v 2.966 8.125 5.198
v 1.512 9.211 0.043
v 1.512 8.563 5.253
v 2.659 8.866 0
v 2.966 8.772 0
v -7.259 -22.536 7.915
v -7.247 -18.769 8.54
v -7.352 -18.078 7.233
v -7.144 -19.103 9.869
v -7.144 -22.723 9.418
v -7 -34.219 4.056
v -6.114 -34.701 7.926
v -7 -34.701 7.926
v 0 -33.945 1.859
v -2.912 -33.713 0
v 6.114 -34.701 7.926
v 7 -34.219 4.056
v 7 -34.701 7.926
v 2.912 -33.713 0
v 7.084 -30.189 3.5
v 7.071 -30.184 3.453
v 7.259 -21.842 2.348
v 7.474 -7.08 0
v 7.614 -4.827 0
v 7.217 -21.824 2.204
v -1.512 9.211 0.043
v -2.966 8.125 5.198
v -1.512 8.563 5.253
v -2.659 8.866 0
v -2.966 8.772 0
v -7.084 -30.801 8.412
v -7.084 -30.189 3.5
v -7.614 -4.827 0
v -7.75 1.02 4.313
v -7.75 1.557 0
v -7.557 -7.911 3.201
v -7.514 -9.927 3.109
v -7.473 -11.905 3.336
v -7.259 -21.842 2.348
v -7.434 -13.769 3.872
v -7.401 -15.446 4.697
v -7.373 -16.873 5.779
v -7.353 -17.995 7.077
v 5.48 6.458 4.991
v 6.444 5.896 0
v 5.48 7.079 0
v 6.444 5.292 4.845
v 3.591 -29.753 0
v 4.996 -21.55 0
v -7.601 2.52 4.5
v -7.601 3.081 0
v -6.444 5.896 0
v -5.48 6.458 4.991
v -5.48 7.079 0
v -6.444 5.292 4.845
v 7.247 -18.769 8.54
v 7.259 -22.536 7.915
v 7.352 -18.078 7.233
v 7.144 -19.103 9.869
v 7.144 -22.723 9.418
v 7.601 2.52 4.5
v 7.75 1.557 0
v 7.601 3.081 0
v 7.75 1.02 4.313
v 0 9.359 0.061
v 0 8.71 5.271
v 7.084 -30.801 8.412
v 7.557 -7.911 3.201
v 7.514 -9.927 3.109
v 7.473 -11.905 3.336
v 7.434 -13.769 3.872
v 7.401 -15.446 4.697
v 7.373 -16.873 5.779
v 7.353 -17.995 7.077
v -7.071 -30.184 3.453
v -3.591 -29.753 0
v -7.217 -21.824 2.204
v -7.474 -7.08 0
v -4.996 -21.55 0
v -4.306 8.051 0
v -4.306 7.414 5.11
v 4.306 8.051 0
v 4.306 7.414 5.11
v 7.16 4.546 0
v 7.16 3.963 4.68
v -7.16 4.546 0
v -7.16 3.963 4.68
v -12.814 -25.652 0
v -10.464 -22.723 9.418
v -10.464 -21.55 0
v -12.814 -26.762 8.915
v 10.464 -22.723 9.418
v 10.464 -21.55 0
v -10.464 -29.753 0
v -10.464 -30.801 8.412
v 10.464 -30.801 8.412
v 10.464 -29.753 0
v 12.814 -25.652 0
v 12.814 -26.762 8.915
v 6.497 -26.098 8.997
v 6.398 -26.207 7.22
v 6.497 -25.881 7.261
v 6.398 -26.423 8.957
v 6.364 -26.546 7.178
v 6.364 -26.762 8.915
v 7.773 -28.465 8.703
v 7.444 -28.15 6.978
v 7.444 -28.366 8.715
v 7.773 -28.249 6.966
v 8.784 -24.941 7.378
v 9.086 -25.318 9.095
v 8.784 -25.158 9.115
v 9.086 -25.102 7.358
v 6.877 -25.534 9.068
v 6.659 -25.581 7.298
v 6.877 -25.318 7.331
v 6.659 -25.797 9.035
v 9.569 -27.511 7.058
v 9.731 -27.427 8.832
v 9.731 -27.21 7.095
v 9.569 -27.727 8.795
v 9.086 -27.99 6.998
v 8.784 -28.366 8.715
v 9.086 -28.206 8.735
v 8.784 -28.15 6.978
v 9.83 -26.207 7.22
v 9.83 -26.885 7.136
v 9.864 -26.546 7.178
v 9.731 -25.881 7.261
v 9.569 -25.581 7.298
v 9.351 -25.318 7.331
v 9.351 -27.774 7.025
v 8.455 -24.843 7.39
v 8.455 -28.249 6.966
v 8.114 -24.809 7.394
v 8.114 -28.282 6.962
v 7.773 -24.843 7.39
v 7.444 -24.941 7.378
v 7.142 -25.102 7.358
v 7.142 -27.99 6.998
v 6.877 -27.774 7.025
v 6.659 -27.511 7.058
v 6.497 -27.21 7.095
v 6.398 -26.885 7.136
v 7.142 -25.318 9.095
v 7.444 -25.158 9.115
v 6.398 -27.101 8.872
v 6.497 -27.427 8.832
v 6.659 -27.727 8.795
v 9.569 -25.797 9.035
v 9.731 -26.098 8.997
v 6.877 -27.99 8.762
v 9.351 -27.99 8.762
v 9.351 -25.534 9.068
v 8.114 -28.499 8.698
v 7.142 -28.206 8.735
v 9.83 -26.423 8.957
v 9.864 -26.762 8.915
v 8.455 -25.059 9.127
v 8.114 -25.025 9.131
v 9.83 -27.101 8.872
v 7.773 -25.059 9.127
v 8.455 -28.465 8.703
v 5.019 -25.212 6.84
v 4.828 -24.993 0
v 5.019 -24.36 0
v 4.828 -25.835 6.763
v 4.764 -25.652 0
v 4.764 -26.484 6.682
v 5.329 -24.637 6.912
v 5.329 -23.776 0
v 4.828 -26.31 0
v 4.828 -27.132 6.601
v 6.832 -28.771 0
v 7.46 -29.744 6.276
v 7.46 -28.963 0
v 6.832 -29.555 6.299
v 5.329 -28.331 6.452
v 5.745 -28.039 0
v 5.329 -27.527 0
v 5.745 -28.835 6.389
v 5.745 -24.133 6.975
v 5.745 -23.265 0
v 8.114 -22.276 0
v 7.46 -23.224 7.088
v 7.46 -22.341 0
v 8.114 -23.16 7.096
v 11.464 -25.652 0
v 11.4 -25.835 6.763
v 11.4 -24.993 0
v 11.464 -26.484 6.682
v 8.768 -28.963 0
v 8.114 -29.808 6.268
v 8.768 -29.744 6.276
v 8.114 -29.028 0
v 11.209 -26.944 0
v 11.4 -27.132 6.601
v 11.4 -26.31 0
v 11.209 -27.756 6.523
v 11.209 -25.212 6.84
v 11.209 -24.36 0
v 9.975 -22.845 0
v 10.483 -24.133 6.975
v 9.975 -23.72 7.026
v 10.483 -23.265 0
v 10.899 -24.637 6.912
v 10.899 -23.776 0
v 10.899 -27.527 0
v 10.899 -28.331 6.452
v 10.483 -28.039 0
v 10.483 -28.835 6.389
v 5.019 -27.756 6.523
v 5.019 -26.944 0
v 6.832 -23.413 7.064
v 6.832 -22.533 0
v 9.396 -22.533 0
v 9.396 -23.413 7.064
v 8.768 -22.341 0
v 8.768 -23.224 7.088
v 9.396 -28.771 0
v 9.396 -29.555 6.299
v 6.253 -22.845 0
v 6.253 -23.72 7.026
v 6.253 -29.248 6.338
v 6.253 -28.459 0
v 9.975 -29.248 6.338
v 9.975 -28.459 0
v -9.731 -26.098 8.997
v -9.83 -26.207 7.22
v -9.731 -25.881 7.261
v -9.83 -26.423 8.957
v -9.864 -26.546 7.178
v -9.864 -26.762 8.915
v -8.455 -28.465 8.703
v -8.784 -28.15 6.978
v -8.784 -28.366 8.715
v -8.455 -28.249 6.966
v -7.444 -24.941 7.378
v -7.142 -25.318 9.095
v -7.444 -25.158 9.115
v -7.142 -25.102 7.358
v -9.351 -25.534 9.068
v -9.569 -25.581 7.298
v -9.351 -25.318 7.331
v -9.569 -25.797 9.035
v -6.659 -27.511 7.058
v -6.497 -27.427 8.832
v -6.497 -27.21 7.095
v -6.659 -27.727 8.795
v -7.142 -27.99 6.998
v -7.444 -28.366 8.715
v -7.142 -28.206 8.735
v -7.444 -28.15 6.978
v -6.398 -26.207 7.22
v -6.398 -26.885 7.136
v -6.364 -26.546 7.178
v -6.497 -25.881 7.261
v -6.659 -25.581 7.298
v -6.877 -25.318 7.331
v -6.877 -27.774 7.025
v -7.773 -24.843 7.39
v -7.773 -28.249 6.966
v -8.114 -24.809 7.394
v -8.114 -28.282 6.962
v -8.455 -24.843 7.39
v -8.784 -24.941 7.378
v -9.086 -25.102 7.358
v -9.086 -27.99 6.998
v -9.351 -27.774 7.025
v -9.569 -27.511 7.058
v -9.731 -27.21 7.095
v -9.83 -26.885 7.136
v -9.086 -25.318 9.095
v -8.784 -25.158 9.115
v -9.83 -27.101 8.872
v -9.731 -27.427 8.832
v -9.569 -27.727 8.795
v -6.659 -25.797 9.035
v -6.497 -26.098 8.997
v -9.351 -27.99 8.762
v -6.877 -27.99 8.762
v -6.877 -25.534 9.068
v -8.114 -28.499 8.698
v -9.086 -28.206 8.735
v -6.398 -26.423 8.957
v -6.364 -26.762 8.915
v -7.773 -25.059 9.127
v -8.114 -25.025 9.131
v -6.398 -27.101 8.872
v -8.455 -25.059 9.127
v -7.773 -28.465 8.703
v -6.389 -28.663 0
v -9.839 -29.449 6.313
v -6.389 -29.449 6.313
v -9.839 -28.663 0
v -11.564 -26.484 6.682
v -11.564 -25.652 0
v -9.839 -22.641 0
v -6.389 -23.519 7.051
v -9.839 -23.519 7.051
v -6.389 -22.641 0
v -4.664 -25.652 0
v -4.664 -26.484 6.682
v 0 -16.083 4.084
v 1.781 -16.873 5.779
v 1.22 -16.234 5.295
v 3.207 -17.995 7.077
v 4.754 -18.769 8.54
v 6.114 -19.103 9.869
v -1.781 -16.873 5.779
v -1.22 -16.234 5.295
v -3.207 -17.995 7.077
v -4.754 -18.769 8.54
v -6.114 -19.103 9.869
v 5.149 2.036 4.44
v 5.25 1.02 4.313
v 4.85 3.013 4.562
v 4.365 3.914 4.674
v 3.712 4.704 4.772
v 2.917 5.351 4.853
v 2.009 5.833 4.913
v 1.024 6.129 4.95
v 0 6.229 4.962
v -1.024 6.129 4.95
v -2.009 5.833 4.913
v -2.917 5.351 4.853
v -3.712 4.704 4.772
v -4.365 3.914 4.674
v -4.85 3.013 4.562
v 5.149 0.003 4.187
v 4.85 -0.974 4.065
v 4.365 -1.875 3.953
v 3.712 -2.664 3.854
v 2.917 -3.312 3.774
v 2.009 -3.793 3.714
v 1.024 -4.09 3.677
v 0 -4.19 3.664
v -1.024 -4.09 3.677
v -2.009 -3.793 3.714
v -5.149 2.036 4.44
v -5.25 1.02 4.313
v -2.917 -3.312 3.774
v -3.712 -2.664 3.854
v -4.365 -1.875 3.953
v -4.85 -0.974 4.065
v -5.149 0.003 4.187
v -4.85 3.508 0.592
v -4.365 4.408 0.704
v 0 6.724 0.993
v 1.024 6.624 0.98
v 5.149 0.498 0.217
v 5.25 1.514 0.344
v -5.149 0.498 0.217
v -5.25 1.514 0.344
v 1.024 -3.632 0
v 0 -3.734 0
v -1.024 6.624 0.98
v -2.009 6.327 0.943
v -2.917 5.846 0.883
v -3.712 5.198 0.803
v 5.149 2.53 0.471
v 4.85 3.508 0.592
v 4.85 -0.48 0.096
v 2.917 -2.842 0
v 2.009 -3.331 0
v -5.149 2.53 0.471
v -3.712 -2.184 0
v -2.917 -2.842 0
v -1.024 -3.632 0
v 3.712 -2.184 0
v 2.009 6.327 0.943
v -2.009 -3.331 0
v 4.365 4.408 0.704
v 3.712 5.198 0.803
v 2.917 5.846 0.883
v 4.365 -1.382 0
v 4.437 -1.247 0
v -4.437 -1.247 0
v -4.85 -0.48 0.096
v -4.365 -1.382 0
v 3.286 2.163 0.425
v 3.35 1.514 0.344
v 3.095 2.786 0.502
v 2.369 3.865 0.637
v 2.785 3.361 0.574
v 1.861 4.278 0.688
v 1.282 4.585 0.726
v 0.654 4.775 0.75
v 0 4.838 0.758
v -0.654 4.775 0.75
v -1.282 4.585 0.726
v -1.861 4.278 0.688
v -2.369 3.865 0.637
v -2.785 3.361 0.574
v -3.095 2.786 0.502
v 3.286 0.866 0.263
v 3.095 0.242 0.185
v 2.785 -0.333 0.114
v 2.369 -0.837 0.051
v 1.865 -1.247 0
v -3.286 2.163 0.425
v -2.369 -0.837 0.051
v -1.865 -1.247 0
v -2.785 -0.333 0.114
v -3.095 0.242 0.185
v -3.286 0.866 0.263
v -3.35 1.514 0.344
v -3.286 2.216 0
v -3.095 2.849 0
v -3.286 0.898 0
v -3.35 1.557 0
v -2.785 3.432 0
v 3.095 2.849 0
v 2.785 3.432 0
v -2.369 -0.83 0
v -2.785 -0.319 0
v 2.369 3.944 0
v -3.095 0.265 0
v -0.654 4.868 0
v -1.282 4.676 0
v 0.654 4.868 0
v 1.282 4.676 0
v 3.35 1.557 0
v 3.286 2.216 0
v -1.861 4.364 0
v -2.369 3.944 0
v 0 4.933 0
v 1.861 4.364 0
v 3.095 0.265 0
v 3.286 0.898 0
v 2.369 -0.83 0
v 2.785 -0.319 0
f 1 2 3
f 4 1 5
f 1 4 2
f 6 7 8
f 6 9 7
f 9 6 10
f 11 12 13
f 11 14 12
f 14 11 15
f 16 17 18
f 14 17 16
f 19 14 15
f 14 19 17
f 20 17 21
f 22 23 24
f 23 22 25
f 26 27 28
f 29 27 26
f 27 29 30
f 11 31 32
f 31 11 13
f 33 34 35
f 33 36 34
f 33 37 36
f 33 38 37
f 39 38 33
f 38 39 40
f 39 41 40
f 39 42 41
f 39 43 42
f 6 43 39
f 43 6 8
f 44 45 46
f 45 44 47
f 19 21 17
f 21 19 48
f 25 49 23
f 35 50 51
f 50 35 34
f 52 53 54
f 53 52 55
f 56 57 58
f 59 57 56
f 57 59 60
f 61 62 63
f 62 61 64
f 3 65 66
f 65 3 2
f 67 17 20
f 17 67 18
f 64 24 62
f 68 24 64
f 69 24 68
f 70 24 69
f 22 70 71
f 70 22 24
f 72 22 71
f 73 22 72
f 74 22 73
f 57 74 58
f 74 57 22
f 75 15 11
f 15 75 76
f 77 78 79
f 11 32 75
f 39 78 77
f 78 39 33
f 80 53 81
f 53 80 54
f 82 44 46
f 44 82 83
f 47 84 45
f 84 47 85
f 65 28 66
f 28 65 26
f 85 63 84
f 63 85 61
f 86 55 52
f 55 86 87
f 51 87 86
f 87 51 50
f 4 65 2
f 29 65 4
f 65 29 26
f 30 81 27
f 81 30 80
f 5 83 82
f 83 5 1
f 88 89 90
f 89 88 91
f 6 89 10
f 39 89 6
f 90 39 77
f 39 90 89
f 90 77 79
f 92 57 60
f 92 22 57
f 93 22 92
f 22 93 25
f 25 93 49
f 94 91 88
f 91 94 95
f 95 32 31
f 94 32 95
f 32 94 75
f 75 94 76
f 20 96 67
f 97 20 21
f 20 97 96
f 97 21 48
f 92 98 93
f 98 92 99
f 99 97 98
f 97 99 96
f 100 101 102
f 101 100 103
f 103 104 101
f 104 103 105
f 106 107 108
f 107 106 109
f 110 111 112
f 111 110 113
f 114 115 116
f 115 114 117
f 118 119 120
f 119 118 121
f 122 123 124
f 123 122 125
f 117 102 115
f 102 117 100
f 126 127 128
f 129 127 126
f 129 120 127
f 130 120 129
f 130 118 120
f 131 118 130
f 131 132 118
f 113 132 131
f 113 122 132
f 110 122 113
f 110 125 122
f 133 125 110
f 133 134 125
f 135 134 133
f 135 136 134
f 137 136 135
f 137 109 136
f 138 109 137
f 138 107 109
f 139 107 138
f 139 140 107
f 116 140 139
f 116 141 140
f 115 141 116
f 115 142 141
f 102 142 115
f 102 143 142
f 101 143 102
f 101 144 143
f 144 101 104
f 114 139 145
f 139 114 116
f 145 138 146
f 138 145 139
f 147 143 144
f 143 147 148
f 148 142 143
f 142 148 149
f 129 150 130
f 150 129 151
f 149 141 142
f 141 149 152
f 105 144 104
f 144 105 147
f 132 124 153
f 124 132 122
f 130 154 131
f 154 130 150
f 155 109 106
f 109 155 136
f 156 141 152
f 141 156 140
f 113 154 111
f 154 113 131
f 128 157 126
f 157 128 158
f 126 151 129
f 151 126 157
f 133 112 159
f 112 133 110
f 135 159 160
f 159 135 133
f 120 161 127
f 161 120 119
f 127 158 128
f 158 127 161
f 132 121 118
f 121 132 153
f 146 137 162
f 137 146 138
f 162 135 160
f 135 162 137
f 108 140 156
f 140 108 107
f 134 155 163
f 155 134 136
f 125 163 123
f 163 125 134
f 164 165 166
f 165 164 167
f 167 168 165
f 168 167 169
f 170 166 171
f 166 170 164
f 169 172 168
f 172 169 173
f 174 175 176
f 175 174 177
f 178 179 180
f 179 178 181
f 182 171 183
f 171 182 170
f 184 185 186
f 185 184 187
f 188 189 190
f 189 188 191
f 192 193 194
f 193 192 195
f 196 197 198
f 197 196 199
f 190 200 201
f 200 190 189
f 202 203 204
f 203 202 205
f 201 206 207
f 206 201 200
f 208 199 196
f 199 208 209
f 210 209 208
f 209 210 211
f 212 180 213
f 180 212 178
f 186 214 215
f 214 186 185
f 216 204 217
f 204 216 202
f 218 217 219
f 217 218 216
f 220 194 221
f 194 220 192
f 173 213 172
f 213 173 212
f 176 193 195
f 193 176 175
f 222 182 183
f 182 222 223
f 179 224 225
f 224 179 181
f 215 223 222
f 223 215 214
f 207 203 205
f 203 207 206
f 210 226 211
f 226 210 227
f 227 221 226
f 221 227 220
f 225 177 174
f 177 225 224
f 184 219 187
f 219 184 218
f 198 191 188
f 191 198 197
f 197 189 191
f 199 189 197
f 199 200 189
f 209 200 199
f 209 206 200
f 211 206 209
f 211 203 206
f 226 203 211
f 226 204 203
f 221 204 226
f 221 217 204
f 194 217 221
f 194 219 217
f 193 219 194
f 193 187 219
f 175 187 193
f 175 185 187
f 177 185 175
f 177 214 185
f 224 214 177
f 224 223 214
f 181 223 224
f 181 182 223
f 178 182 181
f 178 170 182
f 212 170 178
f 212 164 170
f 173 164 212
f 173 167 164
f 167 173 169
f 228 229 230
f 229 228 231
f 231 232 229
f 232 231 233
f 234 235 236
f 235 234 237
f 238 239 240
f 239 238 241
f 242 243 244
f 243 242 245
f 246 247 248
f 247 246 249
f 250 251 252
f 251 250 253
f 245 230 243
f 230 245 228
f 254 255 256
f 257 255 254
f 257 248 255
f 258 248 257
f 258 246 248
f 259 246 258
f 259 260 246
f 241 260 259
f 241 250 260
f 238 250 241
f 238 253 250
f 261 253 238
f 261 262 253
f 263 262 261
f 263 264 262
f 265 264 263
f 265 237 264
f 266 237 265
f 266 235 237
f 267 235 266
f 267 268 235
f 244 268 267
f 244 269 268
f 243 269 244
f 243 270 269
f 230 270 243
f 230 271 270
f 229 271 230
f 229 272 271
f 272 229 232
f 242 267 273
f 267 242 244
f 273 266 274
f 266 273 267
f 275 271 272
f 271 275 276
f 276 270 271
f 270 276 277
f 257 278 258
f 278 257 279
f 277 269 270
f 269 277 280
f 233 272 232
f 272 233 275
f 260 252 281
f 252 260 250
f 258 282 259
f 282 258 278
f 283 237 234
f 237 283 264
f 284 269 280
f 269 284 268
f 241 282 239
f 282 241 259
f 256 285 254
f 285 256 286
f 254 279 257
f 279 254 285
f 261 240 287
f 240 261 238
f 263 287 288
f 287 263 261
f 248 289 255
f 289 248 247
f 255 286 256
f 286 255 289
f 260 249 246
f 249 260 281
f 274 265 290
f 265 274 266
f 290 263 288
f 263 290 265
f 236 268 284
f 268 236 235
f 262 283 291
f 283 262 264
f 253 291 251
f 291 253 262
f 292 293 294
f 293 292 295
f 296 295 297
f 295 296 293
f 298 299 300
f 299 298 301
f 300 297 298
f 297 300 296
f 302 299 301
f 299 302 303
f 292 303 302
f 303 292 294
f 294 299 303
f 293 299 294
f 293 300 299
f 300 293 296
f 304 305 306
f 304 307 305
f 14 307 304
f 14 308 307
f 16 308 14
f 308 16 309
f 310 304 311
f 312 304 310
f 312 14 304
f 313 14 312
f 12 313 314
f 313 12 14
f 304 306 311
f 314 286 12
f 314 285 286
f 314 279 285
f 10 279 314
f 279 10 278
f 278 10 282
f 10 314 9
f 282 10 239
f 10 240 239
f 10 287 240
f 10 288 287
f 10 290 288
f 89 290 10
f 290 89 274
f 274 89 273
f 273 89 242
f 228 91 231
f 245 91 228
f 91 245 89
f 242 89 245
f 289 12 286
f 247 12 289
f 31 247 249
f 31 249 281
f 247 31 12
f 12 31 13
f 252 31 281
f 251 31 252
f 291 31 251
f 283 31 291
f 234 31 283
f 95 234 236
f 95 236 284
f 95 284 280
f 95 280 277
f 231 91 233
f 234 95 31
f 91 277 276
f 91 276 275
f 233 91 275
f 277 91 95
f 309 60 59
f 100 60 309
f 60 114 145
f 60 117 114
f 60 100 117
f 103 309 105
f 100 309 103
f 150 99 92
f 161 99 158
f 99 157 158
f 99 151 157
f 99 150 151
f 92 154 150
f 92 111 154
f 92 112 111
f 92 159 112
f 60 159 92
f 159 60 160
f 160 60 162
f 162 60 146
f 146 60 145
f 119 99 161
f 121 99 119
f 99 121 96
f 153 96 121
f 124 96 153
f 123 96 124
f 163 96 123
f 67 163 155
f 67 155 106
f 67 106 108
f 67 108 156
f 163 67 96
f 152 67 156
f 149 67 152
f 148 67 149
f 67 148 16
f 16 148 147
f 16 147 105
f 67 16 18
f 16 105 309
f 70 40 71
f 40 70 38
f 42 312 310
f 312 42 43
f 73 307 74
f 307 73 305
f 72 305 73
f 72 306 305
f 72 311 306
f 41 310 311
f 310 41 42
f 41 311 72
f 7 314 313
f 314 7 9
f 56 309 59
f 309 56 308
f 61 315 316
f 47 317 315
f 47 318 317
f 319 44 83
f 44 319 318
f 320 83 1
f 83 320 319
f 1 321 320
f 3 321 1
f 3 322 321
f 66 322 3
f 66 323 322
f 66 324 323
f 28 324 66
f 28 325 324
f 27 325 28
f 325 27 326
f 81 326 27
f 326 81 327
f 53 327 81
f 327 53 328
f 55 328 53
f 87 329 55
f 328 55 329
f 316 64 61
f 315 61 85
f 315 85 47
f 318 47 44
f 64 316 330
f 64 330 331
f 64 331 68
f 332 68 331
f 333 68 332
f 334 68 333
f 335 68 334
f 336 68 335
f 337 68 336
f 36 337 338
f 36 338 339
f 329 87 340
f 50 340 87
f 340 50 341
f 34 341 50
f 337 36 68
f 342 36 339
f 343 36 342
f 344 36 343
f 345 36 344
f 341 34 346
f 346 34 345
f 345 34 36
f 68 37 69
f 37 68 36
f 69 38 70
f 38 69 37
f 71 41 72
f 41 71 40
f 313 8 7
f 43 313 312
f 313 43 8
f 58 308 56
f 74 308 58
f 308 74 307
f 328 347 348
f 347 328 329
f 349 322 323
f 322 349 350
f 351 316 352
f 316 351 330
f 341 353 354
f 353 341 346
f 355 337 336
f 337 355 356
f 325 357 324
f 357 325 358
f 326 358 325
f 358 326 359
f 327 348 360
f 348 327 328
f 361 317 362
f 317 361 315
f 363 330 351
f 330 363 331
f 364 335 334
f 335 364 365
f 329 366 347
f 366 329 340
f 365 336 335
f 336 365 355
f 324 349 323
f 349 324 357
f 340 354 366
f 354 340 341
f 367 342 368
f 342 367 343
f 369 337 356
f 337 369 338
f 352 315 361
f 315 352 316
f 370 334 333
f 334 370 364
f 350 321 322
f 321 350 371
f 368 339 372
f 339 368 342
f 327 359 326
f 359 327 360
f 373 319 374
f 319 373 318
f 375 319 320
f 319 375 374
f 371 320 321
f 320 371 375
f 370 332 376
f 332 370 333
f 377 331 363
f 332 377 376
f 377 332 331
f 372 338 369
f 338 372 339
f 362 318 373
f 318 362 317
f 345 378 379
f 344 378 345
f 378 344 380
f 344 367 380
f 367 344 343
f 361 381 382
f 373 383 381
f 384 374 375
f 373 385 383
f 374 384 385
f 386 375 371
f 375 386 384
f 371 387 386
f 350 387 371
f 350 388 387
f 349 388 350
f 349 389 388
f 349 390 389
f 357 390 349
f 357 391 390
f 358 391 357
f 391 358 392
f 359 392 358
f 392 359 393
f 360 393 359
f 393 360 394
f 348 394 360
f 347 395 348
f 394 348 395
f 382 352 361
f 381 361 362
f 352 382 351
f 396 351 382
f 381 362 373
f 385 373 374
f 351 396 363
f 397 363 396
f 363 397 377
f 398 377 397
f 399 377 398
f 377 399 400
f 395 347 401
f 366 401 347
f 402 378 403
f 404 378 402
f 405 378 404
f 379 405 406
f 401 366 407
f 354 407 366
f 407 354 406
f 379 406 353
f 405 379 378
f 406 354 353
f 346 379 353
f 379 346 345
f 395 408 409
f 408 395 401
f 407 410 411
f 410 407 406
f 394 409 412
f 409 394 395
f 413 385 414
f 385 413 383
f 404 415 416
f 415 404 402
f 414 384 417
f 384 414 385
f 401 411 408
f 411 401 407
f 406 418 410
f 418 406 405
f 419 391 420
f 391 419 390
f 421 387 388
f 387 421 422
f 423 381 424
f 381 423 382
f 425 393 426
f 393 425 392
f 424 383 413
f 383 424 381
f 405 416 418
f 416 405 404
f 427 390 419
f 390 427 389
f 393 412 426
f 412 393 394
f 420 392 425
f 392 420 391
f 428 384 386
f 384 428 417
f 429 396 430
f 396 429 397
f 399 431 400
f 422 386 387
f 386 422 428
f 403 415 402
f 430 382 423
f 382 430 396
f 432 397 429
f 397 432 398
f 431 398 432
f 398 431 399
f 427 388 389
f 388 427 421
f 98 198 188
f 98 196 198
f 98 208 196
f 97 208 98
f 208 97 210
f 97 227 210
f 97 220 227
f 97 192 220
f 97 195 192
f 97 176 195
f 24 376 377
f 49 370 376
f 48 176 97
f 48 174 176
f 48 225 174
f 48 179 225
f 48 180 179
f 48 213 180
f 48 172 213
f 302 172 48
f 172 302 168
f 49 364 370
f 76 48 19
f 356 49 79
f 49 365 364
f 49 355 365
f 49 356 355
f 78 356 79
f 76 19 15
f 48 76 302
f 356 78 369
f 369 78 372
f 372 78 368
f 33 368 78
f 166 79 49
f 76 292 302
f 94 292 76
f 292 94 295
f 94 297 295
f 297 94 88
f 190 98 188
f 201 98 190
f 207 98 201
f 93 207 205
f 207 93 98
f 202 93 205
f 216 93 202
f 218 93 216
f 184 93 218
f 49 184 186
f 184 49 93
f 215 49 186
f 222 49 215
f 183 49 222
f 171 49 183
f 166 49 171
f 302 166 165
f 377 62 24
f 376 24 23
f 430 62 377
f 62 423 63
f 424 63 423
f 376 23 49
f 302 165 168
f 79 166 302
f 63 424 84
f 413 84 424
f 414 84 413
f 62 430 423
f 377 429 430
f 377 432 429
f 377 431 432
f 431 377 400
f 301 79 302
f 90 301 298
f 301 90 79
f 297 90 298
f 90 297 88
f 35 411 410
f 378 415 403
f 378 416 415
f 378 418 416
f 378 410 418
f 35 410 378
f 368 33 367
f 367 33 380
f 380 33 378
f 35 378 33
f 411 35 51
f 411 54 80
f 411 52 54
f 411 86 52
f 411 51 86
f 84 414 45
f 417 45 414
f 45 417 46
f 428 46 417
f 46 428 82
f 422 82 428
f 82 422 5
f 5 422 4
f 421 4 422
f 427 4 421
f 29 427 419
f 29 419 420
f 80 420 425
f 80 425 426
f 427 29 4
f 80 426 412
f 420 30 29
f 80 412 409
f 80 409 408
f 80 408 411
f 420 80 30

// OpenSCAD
slop = .25;

screw_dia = 3;
screw_rad = screw_dia/2+slop;

cap_dia = 5.7;
cap_rad = cap_dia/2+slop;
cap_thick = 1.65+slop/2;
cap_hex_rad = (2/cos(30))/2;

nut_dia = 6.4;
nut_rad = nut_dia/2+slop;
nut_thick = 2.4+slop;

bearing_dia = 10;
bearing_rad = bearing_dia/2+slop;
bearing_thick = 5+slop;



wall = 2.5;
bearing_cone_height = 2;
arm_width = 14;
center = arm_width-bearing_cone_height*2-slop*2;
center_height = nut_dia+wall/2;
screw_len = 11;

//%cube([27,27,27],center=true);

$fn=32;

//uses two m3 by 10mm, one m3 by 30mm, three nuts, four 603zz bearings.
*union(){
	rotate([0,90,0]) center();
	half_arm();
	rotate([0,180,0]) half_arm();

	rotate([0,0,180]) rotate([0,90,0]) rotate([80,0,0]){
		half_arm();
		rotate([0,180,0]) half_arm();
	}
}

//for printing
difference(){
	translate([0,0,12.5]) rotate([7.1,0,0]) rotate([0,90,0]) half_arm();
	translate([0,0,-25]) cube([100,100,50], center=true);
}
//center();


//NOTE:  Rostock jaws are 8.4mm wide.
echo("arm_sep=", center+bearing_cone_height*2);
//Right now these are 13.5mm.  That's kind of a lot.




module half_arm(){
	rod_rad = 4.5;
	width = arm_width+wall+bearing_thick*2;
	cutout_offset = 9;
	clamp_dist = -27;

	difference(){
		union(){
			hull(){
				//caress the bearing
				translate([arm_width/2+wall/2,0,0]) rotate([0,90,0]) cylinder(r=bearing_rad+wall, h=bearing_thick);
				//grab the rod
				translate([wall/2,-20,0]) rotate([90,0,0]) rotate([0,0,22.5]) cylinder(r=(rod_rad+wall)/cos(22.5), h=30, center=true, $fn=8);
			}

			//clamping wings
			hull(){
				for(i=[0,1]) mirror([0,0,i]) translate([0, clamp_dist, rod_rad/cos(45)+screw_rad]) rotate([0,90,0]) rotate([0,0,0]) cylinder(r=nut_rad+wall/2, h=wall*4, $fn=6);
				//translate([0, clamp_dist, 0]) rotate([0,90,0]) rotate([0,0,0]) cylinder(r=nut_rad+wall/2, h=wall*4, $fn=6);
			}
		}

		//rod cutout
		translate([0,-32,0]) rotate([90,0,0]) cylinder(r=rod_rad/cos(45), h=30, center=true, $fn=4);
		translate([-25+slop,0,0]) cube([50,100,100],center=true);

		//center hole
		hull(){
			for(i=[0,1]) mirror([0,i,0]) translate([0,cutout_offset,0]) scale([1,1.25,1]) cylinder(r=(arm_width+wall)/2, h=50, center=true);
			
		}

		//screw mounts
		translate([-wall, clamp_dist, rod_rad/cos(45)+screw_rad]) rotate([0,90,0]){
			cylinder(r=screw_rad, h=wall*2-.5);
			translate([0,0,wall*2]) cylinder(r=cap_rad+slop, h=10);
		}
		translate([-wall, clamp_dist, -rod_rad/cos(45)-screw_rad]) rotate([0,90,0]){
			cylinder(r=screw_rad, h=wall*2-.5);
			translate([0,0,wall*2]) cylinder(r=nut_rad, h=10, $fn=6);
		}

		//bearing hole
		translate([arm_width/2+wall/2-bearing_thick*3,0,0]) rotate([0,90,0])cylinder(r=bearing_rad+wall, h=bearing_thick*3);
		translate([arm_width/2,0,0]) rotate([0,90,0])cylinder(r=bearing_rad, h=bearing_thick);
		translate([arm_width/2+wall,0,0]) rotate([0,90,0]) cylinder(r=cap_rad+slop, h=bearing_thick);
	}
}

//this is a m3 bearing mounted up against the hotend effector, modifying the current design for the smaller bolt.
//Should be a bit more compact.
module triple_center(){
	%translate([0,0,bearing_rad]) bearing();
	

}

module center(){
	screw_offset = -screw_len/2+center/2+bearing_thick+bearing_cone_height;
	difference(){
		hull(){
			intersection(){
				cube([center, center, center_height],center=true);
				rotate([0,0,45]) cube([center, center, center_height],center=true);
			}
		
			for(i=[0:90:359]) rotate([0,0,i])  rotate([0,90,0]) translate([0,0,center/2]) cylinder(r1=center_height/2, r2=cap_rad, h=bearing_cone_height);
		}

		//core it
		intersection(){
			cube([center-wall*2, center-wall*2, center_height+.1],center=true);
			rotate([0,0,45]) cube([center-wall*2, center-wall*2, center_height+.1],center=true);
		}

		//screwholes
		for(i=[0:90:359]) rotate([0,0,i]){
			//screws
			#rotate([0,90,0]) translate([0,0,screw_offset]) cap_screw(screw_len);
			//bearings - these are just drawn in place
			%rotate([0,90,0]) translate([0,0,center/2+bearing_cone_height]) bearing();
		}
		//nut traps
		hull() {
			//rotate([0,0,30]) cylinder(r=nut_rad, h=nut_thick, center=true, $fn=6);
			translate([0,0,center_height/2]) for(i=[0:180:359]) rotate([0,0,i]) rotate([0,90,0]) translate([0,0,center/2+bearing_cone_height-nut_thick/2-wall])
				rotate([0,0,30]) cylinder(r=nut_rad, h=nut_thick, center=true, $fn=6);
		}
	}
}

module bearing(){
	difference(){
		cylinder(r=bearing_rad, h=bearing_thick);
		translate([0,0,-.1]) cylinder(r=screw_rad, h=bearing_thick+.2);
	}
}

module cap_screw(len = 10){
	color([.25,.25,.25])
	difference(){
		union(){
			translate([0,0,-len/2]) rotate([0,0,-90]) cap_cylinder(r=screw_rad, h=len, center=true);
			translate([0,0,len/2-.1]) difference(){
				scale([1,1,.75]) sphere(r=cap_rad);
				translate([0,0,-cap_dia/2]) cube([cap_dia+1, cap_dia+1, cap_dia],center=true);
				translate([0,0,cap_dia/2+.1+cap_thick]) cube([cap_dia+1, cap_dia+1, cap_dia],center=true);
			}
		}
		
		translate([0,0,len/2+slop]) cylinder(r=cap_hex_rad, h=cap_thick, $fn=6);
	}
}

module cap_cylinder(r=1, h=1){
	cylinder(r=r, h=h);
	intersection(){
		rotate([0,0,22.5]) cylinder(r=r/cos(180/8), h=h, $fn=8);
		translate([0,-r/cos(180/4),0]) rotate([0,0,0]) cylinder(r=r/cos(180/4), h=h, $fn=4);
	}
}
